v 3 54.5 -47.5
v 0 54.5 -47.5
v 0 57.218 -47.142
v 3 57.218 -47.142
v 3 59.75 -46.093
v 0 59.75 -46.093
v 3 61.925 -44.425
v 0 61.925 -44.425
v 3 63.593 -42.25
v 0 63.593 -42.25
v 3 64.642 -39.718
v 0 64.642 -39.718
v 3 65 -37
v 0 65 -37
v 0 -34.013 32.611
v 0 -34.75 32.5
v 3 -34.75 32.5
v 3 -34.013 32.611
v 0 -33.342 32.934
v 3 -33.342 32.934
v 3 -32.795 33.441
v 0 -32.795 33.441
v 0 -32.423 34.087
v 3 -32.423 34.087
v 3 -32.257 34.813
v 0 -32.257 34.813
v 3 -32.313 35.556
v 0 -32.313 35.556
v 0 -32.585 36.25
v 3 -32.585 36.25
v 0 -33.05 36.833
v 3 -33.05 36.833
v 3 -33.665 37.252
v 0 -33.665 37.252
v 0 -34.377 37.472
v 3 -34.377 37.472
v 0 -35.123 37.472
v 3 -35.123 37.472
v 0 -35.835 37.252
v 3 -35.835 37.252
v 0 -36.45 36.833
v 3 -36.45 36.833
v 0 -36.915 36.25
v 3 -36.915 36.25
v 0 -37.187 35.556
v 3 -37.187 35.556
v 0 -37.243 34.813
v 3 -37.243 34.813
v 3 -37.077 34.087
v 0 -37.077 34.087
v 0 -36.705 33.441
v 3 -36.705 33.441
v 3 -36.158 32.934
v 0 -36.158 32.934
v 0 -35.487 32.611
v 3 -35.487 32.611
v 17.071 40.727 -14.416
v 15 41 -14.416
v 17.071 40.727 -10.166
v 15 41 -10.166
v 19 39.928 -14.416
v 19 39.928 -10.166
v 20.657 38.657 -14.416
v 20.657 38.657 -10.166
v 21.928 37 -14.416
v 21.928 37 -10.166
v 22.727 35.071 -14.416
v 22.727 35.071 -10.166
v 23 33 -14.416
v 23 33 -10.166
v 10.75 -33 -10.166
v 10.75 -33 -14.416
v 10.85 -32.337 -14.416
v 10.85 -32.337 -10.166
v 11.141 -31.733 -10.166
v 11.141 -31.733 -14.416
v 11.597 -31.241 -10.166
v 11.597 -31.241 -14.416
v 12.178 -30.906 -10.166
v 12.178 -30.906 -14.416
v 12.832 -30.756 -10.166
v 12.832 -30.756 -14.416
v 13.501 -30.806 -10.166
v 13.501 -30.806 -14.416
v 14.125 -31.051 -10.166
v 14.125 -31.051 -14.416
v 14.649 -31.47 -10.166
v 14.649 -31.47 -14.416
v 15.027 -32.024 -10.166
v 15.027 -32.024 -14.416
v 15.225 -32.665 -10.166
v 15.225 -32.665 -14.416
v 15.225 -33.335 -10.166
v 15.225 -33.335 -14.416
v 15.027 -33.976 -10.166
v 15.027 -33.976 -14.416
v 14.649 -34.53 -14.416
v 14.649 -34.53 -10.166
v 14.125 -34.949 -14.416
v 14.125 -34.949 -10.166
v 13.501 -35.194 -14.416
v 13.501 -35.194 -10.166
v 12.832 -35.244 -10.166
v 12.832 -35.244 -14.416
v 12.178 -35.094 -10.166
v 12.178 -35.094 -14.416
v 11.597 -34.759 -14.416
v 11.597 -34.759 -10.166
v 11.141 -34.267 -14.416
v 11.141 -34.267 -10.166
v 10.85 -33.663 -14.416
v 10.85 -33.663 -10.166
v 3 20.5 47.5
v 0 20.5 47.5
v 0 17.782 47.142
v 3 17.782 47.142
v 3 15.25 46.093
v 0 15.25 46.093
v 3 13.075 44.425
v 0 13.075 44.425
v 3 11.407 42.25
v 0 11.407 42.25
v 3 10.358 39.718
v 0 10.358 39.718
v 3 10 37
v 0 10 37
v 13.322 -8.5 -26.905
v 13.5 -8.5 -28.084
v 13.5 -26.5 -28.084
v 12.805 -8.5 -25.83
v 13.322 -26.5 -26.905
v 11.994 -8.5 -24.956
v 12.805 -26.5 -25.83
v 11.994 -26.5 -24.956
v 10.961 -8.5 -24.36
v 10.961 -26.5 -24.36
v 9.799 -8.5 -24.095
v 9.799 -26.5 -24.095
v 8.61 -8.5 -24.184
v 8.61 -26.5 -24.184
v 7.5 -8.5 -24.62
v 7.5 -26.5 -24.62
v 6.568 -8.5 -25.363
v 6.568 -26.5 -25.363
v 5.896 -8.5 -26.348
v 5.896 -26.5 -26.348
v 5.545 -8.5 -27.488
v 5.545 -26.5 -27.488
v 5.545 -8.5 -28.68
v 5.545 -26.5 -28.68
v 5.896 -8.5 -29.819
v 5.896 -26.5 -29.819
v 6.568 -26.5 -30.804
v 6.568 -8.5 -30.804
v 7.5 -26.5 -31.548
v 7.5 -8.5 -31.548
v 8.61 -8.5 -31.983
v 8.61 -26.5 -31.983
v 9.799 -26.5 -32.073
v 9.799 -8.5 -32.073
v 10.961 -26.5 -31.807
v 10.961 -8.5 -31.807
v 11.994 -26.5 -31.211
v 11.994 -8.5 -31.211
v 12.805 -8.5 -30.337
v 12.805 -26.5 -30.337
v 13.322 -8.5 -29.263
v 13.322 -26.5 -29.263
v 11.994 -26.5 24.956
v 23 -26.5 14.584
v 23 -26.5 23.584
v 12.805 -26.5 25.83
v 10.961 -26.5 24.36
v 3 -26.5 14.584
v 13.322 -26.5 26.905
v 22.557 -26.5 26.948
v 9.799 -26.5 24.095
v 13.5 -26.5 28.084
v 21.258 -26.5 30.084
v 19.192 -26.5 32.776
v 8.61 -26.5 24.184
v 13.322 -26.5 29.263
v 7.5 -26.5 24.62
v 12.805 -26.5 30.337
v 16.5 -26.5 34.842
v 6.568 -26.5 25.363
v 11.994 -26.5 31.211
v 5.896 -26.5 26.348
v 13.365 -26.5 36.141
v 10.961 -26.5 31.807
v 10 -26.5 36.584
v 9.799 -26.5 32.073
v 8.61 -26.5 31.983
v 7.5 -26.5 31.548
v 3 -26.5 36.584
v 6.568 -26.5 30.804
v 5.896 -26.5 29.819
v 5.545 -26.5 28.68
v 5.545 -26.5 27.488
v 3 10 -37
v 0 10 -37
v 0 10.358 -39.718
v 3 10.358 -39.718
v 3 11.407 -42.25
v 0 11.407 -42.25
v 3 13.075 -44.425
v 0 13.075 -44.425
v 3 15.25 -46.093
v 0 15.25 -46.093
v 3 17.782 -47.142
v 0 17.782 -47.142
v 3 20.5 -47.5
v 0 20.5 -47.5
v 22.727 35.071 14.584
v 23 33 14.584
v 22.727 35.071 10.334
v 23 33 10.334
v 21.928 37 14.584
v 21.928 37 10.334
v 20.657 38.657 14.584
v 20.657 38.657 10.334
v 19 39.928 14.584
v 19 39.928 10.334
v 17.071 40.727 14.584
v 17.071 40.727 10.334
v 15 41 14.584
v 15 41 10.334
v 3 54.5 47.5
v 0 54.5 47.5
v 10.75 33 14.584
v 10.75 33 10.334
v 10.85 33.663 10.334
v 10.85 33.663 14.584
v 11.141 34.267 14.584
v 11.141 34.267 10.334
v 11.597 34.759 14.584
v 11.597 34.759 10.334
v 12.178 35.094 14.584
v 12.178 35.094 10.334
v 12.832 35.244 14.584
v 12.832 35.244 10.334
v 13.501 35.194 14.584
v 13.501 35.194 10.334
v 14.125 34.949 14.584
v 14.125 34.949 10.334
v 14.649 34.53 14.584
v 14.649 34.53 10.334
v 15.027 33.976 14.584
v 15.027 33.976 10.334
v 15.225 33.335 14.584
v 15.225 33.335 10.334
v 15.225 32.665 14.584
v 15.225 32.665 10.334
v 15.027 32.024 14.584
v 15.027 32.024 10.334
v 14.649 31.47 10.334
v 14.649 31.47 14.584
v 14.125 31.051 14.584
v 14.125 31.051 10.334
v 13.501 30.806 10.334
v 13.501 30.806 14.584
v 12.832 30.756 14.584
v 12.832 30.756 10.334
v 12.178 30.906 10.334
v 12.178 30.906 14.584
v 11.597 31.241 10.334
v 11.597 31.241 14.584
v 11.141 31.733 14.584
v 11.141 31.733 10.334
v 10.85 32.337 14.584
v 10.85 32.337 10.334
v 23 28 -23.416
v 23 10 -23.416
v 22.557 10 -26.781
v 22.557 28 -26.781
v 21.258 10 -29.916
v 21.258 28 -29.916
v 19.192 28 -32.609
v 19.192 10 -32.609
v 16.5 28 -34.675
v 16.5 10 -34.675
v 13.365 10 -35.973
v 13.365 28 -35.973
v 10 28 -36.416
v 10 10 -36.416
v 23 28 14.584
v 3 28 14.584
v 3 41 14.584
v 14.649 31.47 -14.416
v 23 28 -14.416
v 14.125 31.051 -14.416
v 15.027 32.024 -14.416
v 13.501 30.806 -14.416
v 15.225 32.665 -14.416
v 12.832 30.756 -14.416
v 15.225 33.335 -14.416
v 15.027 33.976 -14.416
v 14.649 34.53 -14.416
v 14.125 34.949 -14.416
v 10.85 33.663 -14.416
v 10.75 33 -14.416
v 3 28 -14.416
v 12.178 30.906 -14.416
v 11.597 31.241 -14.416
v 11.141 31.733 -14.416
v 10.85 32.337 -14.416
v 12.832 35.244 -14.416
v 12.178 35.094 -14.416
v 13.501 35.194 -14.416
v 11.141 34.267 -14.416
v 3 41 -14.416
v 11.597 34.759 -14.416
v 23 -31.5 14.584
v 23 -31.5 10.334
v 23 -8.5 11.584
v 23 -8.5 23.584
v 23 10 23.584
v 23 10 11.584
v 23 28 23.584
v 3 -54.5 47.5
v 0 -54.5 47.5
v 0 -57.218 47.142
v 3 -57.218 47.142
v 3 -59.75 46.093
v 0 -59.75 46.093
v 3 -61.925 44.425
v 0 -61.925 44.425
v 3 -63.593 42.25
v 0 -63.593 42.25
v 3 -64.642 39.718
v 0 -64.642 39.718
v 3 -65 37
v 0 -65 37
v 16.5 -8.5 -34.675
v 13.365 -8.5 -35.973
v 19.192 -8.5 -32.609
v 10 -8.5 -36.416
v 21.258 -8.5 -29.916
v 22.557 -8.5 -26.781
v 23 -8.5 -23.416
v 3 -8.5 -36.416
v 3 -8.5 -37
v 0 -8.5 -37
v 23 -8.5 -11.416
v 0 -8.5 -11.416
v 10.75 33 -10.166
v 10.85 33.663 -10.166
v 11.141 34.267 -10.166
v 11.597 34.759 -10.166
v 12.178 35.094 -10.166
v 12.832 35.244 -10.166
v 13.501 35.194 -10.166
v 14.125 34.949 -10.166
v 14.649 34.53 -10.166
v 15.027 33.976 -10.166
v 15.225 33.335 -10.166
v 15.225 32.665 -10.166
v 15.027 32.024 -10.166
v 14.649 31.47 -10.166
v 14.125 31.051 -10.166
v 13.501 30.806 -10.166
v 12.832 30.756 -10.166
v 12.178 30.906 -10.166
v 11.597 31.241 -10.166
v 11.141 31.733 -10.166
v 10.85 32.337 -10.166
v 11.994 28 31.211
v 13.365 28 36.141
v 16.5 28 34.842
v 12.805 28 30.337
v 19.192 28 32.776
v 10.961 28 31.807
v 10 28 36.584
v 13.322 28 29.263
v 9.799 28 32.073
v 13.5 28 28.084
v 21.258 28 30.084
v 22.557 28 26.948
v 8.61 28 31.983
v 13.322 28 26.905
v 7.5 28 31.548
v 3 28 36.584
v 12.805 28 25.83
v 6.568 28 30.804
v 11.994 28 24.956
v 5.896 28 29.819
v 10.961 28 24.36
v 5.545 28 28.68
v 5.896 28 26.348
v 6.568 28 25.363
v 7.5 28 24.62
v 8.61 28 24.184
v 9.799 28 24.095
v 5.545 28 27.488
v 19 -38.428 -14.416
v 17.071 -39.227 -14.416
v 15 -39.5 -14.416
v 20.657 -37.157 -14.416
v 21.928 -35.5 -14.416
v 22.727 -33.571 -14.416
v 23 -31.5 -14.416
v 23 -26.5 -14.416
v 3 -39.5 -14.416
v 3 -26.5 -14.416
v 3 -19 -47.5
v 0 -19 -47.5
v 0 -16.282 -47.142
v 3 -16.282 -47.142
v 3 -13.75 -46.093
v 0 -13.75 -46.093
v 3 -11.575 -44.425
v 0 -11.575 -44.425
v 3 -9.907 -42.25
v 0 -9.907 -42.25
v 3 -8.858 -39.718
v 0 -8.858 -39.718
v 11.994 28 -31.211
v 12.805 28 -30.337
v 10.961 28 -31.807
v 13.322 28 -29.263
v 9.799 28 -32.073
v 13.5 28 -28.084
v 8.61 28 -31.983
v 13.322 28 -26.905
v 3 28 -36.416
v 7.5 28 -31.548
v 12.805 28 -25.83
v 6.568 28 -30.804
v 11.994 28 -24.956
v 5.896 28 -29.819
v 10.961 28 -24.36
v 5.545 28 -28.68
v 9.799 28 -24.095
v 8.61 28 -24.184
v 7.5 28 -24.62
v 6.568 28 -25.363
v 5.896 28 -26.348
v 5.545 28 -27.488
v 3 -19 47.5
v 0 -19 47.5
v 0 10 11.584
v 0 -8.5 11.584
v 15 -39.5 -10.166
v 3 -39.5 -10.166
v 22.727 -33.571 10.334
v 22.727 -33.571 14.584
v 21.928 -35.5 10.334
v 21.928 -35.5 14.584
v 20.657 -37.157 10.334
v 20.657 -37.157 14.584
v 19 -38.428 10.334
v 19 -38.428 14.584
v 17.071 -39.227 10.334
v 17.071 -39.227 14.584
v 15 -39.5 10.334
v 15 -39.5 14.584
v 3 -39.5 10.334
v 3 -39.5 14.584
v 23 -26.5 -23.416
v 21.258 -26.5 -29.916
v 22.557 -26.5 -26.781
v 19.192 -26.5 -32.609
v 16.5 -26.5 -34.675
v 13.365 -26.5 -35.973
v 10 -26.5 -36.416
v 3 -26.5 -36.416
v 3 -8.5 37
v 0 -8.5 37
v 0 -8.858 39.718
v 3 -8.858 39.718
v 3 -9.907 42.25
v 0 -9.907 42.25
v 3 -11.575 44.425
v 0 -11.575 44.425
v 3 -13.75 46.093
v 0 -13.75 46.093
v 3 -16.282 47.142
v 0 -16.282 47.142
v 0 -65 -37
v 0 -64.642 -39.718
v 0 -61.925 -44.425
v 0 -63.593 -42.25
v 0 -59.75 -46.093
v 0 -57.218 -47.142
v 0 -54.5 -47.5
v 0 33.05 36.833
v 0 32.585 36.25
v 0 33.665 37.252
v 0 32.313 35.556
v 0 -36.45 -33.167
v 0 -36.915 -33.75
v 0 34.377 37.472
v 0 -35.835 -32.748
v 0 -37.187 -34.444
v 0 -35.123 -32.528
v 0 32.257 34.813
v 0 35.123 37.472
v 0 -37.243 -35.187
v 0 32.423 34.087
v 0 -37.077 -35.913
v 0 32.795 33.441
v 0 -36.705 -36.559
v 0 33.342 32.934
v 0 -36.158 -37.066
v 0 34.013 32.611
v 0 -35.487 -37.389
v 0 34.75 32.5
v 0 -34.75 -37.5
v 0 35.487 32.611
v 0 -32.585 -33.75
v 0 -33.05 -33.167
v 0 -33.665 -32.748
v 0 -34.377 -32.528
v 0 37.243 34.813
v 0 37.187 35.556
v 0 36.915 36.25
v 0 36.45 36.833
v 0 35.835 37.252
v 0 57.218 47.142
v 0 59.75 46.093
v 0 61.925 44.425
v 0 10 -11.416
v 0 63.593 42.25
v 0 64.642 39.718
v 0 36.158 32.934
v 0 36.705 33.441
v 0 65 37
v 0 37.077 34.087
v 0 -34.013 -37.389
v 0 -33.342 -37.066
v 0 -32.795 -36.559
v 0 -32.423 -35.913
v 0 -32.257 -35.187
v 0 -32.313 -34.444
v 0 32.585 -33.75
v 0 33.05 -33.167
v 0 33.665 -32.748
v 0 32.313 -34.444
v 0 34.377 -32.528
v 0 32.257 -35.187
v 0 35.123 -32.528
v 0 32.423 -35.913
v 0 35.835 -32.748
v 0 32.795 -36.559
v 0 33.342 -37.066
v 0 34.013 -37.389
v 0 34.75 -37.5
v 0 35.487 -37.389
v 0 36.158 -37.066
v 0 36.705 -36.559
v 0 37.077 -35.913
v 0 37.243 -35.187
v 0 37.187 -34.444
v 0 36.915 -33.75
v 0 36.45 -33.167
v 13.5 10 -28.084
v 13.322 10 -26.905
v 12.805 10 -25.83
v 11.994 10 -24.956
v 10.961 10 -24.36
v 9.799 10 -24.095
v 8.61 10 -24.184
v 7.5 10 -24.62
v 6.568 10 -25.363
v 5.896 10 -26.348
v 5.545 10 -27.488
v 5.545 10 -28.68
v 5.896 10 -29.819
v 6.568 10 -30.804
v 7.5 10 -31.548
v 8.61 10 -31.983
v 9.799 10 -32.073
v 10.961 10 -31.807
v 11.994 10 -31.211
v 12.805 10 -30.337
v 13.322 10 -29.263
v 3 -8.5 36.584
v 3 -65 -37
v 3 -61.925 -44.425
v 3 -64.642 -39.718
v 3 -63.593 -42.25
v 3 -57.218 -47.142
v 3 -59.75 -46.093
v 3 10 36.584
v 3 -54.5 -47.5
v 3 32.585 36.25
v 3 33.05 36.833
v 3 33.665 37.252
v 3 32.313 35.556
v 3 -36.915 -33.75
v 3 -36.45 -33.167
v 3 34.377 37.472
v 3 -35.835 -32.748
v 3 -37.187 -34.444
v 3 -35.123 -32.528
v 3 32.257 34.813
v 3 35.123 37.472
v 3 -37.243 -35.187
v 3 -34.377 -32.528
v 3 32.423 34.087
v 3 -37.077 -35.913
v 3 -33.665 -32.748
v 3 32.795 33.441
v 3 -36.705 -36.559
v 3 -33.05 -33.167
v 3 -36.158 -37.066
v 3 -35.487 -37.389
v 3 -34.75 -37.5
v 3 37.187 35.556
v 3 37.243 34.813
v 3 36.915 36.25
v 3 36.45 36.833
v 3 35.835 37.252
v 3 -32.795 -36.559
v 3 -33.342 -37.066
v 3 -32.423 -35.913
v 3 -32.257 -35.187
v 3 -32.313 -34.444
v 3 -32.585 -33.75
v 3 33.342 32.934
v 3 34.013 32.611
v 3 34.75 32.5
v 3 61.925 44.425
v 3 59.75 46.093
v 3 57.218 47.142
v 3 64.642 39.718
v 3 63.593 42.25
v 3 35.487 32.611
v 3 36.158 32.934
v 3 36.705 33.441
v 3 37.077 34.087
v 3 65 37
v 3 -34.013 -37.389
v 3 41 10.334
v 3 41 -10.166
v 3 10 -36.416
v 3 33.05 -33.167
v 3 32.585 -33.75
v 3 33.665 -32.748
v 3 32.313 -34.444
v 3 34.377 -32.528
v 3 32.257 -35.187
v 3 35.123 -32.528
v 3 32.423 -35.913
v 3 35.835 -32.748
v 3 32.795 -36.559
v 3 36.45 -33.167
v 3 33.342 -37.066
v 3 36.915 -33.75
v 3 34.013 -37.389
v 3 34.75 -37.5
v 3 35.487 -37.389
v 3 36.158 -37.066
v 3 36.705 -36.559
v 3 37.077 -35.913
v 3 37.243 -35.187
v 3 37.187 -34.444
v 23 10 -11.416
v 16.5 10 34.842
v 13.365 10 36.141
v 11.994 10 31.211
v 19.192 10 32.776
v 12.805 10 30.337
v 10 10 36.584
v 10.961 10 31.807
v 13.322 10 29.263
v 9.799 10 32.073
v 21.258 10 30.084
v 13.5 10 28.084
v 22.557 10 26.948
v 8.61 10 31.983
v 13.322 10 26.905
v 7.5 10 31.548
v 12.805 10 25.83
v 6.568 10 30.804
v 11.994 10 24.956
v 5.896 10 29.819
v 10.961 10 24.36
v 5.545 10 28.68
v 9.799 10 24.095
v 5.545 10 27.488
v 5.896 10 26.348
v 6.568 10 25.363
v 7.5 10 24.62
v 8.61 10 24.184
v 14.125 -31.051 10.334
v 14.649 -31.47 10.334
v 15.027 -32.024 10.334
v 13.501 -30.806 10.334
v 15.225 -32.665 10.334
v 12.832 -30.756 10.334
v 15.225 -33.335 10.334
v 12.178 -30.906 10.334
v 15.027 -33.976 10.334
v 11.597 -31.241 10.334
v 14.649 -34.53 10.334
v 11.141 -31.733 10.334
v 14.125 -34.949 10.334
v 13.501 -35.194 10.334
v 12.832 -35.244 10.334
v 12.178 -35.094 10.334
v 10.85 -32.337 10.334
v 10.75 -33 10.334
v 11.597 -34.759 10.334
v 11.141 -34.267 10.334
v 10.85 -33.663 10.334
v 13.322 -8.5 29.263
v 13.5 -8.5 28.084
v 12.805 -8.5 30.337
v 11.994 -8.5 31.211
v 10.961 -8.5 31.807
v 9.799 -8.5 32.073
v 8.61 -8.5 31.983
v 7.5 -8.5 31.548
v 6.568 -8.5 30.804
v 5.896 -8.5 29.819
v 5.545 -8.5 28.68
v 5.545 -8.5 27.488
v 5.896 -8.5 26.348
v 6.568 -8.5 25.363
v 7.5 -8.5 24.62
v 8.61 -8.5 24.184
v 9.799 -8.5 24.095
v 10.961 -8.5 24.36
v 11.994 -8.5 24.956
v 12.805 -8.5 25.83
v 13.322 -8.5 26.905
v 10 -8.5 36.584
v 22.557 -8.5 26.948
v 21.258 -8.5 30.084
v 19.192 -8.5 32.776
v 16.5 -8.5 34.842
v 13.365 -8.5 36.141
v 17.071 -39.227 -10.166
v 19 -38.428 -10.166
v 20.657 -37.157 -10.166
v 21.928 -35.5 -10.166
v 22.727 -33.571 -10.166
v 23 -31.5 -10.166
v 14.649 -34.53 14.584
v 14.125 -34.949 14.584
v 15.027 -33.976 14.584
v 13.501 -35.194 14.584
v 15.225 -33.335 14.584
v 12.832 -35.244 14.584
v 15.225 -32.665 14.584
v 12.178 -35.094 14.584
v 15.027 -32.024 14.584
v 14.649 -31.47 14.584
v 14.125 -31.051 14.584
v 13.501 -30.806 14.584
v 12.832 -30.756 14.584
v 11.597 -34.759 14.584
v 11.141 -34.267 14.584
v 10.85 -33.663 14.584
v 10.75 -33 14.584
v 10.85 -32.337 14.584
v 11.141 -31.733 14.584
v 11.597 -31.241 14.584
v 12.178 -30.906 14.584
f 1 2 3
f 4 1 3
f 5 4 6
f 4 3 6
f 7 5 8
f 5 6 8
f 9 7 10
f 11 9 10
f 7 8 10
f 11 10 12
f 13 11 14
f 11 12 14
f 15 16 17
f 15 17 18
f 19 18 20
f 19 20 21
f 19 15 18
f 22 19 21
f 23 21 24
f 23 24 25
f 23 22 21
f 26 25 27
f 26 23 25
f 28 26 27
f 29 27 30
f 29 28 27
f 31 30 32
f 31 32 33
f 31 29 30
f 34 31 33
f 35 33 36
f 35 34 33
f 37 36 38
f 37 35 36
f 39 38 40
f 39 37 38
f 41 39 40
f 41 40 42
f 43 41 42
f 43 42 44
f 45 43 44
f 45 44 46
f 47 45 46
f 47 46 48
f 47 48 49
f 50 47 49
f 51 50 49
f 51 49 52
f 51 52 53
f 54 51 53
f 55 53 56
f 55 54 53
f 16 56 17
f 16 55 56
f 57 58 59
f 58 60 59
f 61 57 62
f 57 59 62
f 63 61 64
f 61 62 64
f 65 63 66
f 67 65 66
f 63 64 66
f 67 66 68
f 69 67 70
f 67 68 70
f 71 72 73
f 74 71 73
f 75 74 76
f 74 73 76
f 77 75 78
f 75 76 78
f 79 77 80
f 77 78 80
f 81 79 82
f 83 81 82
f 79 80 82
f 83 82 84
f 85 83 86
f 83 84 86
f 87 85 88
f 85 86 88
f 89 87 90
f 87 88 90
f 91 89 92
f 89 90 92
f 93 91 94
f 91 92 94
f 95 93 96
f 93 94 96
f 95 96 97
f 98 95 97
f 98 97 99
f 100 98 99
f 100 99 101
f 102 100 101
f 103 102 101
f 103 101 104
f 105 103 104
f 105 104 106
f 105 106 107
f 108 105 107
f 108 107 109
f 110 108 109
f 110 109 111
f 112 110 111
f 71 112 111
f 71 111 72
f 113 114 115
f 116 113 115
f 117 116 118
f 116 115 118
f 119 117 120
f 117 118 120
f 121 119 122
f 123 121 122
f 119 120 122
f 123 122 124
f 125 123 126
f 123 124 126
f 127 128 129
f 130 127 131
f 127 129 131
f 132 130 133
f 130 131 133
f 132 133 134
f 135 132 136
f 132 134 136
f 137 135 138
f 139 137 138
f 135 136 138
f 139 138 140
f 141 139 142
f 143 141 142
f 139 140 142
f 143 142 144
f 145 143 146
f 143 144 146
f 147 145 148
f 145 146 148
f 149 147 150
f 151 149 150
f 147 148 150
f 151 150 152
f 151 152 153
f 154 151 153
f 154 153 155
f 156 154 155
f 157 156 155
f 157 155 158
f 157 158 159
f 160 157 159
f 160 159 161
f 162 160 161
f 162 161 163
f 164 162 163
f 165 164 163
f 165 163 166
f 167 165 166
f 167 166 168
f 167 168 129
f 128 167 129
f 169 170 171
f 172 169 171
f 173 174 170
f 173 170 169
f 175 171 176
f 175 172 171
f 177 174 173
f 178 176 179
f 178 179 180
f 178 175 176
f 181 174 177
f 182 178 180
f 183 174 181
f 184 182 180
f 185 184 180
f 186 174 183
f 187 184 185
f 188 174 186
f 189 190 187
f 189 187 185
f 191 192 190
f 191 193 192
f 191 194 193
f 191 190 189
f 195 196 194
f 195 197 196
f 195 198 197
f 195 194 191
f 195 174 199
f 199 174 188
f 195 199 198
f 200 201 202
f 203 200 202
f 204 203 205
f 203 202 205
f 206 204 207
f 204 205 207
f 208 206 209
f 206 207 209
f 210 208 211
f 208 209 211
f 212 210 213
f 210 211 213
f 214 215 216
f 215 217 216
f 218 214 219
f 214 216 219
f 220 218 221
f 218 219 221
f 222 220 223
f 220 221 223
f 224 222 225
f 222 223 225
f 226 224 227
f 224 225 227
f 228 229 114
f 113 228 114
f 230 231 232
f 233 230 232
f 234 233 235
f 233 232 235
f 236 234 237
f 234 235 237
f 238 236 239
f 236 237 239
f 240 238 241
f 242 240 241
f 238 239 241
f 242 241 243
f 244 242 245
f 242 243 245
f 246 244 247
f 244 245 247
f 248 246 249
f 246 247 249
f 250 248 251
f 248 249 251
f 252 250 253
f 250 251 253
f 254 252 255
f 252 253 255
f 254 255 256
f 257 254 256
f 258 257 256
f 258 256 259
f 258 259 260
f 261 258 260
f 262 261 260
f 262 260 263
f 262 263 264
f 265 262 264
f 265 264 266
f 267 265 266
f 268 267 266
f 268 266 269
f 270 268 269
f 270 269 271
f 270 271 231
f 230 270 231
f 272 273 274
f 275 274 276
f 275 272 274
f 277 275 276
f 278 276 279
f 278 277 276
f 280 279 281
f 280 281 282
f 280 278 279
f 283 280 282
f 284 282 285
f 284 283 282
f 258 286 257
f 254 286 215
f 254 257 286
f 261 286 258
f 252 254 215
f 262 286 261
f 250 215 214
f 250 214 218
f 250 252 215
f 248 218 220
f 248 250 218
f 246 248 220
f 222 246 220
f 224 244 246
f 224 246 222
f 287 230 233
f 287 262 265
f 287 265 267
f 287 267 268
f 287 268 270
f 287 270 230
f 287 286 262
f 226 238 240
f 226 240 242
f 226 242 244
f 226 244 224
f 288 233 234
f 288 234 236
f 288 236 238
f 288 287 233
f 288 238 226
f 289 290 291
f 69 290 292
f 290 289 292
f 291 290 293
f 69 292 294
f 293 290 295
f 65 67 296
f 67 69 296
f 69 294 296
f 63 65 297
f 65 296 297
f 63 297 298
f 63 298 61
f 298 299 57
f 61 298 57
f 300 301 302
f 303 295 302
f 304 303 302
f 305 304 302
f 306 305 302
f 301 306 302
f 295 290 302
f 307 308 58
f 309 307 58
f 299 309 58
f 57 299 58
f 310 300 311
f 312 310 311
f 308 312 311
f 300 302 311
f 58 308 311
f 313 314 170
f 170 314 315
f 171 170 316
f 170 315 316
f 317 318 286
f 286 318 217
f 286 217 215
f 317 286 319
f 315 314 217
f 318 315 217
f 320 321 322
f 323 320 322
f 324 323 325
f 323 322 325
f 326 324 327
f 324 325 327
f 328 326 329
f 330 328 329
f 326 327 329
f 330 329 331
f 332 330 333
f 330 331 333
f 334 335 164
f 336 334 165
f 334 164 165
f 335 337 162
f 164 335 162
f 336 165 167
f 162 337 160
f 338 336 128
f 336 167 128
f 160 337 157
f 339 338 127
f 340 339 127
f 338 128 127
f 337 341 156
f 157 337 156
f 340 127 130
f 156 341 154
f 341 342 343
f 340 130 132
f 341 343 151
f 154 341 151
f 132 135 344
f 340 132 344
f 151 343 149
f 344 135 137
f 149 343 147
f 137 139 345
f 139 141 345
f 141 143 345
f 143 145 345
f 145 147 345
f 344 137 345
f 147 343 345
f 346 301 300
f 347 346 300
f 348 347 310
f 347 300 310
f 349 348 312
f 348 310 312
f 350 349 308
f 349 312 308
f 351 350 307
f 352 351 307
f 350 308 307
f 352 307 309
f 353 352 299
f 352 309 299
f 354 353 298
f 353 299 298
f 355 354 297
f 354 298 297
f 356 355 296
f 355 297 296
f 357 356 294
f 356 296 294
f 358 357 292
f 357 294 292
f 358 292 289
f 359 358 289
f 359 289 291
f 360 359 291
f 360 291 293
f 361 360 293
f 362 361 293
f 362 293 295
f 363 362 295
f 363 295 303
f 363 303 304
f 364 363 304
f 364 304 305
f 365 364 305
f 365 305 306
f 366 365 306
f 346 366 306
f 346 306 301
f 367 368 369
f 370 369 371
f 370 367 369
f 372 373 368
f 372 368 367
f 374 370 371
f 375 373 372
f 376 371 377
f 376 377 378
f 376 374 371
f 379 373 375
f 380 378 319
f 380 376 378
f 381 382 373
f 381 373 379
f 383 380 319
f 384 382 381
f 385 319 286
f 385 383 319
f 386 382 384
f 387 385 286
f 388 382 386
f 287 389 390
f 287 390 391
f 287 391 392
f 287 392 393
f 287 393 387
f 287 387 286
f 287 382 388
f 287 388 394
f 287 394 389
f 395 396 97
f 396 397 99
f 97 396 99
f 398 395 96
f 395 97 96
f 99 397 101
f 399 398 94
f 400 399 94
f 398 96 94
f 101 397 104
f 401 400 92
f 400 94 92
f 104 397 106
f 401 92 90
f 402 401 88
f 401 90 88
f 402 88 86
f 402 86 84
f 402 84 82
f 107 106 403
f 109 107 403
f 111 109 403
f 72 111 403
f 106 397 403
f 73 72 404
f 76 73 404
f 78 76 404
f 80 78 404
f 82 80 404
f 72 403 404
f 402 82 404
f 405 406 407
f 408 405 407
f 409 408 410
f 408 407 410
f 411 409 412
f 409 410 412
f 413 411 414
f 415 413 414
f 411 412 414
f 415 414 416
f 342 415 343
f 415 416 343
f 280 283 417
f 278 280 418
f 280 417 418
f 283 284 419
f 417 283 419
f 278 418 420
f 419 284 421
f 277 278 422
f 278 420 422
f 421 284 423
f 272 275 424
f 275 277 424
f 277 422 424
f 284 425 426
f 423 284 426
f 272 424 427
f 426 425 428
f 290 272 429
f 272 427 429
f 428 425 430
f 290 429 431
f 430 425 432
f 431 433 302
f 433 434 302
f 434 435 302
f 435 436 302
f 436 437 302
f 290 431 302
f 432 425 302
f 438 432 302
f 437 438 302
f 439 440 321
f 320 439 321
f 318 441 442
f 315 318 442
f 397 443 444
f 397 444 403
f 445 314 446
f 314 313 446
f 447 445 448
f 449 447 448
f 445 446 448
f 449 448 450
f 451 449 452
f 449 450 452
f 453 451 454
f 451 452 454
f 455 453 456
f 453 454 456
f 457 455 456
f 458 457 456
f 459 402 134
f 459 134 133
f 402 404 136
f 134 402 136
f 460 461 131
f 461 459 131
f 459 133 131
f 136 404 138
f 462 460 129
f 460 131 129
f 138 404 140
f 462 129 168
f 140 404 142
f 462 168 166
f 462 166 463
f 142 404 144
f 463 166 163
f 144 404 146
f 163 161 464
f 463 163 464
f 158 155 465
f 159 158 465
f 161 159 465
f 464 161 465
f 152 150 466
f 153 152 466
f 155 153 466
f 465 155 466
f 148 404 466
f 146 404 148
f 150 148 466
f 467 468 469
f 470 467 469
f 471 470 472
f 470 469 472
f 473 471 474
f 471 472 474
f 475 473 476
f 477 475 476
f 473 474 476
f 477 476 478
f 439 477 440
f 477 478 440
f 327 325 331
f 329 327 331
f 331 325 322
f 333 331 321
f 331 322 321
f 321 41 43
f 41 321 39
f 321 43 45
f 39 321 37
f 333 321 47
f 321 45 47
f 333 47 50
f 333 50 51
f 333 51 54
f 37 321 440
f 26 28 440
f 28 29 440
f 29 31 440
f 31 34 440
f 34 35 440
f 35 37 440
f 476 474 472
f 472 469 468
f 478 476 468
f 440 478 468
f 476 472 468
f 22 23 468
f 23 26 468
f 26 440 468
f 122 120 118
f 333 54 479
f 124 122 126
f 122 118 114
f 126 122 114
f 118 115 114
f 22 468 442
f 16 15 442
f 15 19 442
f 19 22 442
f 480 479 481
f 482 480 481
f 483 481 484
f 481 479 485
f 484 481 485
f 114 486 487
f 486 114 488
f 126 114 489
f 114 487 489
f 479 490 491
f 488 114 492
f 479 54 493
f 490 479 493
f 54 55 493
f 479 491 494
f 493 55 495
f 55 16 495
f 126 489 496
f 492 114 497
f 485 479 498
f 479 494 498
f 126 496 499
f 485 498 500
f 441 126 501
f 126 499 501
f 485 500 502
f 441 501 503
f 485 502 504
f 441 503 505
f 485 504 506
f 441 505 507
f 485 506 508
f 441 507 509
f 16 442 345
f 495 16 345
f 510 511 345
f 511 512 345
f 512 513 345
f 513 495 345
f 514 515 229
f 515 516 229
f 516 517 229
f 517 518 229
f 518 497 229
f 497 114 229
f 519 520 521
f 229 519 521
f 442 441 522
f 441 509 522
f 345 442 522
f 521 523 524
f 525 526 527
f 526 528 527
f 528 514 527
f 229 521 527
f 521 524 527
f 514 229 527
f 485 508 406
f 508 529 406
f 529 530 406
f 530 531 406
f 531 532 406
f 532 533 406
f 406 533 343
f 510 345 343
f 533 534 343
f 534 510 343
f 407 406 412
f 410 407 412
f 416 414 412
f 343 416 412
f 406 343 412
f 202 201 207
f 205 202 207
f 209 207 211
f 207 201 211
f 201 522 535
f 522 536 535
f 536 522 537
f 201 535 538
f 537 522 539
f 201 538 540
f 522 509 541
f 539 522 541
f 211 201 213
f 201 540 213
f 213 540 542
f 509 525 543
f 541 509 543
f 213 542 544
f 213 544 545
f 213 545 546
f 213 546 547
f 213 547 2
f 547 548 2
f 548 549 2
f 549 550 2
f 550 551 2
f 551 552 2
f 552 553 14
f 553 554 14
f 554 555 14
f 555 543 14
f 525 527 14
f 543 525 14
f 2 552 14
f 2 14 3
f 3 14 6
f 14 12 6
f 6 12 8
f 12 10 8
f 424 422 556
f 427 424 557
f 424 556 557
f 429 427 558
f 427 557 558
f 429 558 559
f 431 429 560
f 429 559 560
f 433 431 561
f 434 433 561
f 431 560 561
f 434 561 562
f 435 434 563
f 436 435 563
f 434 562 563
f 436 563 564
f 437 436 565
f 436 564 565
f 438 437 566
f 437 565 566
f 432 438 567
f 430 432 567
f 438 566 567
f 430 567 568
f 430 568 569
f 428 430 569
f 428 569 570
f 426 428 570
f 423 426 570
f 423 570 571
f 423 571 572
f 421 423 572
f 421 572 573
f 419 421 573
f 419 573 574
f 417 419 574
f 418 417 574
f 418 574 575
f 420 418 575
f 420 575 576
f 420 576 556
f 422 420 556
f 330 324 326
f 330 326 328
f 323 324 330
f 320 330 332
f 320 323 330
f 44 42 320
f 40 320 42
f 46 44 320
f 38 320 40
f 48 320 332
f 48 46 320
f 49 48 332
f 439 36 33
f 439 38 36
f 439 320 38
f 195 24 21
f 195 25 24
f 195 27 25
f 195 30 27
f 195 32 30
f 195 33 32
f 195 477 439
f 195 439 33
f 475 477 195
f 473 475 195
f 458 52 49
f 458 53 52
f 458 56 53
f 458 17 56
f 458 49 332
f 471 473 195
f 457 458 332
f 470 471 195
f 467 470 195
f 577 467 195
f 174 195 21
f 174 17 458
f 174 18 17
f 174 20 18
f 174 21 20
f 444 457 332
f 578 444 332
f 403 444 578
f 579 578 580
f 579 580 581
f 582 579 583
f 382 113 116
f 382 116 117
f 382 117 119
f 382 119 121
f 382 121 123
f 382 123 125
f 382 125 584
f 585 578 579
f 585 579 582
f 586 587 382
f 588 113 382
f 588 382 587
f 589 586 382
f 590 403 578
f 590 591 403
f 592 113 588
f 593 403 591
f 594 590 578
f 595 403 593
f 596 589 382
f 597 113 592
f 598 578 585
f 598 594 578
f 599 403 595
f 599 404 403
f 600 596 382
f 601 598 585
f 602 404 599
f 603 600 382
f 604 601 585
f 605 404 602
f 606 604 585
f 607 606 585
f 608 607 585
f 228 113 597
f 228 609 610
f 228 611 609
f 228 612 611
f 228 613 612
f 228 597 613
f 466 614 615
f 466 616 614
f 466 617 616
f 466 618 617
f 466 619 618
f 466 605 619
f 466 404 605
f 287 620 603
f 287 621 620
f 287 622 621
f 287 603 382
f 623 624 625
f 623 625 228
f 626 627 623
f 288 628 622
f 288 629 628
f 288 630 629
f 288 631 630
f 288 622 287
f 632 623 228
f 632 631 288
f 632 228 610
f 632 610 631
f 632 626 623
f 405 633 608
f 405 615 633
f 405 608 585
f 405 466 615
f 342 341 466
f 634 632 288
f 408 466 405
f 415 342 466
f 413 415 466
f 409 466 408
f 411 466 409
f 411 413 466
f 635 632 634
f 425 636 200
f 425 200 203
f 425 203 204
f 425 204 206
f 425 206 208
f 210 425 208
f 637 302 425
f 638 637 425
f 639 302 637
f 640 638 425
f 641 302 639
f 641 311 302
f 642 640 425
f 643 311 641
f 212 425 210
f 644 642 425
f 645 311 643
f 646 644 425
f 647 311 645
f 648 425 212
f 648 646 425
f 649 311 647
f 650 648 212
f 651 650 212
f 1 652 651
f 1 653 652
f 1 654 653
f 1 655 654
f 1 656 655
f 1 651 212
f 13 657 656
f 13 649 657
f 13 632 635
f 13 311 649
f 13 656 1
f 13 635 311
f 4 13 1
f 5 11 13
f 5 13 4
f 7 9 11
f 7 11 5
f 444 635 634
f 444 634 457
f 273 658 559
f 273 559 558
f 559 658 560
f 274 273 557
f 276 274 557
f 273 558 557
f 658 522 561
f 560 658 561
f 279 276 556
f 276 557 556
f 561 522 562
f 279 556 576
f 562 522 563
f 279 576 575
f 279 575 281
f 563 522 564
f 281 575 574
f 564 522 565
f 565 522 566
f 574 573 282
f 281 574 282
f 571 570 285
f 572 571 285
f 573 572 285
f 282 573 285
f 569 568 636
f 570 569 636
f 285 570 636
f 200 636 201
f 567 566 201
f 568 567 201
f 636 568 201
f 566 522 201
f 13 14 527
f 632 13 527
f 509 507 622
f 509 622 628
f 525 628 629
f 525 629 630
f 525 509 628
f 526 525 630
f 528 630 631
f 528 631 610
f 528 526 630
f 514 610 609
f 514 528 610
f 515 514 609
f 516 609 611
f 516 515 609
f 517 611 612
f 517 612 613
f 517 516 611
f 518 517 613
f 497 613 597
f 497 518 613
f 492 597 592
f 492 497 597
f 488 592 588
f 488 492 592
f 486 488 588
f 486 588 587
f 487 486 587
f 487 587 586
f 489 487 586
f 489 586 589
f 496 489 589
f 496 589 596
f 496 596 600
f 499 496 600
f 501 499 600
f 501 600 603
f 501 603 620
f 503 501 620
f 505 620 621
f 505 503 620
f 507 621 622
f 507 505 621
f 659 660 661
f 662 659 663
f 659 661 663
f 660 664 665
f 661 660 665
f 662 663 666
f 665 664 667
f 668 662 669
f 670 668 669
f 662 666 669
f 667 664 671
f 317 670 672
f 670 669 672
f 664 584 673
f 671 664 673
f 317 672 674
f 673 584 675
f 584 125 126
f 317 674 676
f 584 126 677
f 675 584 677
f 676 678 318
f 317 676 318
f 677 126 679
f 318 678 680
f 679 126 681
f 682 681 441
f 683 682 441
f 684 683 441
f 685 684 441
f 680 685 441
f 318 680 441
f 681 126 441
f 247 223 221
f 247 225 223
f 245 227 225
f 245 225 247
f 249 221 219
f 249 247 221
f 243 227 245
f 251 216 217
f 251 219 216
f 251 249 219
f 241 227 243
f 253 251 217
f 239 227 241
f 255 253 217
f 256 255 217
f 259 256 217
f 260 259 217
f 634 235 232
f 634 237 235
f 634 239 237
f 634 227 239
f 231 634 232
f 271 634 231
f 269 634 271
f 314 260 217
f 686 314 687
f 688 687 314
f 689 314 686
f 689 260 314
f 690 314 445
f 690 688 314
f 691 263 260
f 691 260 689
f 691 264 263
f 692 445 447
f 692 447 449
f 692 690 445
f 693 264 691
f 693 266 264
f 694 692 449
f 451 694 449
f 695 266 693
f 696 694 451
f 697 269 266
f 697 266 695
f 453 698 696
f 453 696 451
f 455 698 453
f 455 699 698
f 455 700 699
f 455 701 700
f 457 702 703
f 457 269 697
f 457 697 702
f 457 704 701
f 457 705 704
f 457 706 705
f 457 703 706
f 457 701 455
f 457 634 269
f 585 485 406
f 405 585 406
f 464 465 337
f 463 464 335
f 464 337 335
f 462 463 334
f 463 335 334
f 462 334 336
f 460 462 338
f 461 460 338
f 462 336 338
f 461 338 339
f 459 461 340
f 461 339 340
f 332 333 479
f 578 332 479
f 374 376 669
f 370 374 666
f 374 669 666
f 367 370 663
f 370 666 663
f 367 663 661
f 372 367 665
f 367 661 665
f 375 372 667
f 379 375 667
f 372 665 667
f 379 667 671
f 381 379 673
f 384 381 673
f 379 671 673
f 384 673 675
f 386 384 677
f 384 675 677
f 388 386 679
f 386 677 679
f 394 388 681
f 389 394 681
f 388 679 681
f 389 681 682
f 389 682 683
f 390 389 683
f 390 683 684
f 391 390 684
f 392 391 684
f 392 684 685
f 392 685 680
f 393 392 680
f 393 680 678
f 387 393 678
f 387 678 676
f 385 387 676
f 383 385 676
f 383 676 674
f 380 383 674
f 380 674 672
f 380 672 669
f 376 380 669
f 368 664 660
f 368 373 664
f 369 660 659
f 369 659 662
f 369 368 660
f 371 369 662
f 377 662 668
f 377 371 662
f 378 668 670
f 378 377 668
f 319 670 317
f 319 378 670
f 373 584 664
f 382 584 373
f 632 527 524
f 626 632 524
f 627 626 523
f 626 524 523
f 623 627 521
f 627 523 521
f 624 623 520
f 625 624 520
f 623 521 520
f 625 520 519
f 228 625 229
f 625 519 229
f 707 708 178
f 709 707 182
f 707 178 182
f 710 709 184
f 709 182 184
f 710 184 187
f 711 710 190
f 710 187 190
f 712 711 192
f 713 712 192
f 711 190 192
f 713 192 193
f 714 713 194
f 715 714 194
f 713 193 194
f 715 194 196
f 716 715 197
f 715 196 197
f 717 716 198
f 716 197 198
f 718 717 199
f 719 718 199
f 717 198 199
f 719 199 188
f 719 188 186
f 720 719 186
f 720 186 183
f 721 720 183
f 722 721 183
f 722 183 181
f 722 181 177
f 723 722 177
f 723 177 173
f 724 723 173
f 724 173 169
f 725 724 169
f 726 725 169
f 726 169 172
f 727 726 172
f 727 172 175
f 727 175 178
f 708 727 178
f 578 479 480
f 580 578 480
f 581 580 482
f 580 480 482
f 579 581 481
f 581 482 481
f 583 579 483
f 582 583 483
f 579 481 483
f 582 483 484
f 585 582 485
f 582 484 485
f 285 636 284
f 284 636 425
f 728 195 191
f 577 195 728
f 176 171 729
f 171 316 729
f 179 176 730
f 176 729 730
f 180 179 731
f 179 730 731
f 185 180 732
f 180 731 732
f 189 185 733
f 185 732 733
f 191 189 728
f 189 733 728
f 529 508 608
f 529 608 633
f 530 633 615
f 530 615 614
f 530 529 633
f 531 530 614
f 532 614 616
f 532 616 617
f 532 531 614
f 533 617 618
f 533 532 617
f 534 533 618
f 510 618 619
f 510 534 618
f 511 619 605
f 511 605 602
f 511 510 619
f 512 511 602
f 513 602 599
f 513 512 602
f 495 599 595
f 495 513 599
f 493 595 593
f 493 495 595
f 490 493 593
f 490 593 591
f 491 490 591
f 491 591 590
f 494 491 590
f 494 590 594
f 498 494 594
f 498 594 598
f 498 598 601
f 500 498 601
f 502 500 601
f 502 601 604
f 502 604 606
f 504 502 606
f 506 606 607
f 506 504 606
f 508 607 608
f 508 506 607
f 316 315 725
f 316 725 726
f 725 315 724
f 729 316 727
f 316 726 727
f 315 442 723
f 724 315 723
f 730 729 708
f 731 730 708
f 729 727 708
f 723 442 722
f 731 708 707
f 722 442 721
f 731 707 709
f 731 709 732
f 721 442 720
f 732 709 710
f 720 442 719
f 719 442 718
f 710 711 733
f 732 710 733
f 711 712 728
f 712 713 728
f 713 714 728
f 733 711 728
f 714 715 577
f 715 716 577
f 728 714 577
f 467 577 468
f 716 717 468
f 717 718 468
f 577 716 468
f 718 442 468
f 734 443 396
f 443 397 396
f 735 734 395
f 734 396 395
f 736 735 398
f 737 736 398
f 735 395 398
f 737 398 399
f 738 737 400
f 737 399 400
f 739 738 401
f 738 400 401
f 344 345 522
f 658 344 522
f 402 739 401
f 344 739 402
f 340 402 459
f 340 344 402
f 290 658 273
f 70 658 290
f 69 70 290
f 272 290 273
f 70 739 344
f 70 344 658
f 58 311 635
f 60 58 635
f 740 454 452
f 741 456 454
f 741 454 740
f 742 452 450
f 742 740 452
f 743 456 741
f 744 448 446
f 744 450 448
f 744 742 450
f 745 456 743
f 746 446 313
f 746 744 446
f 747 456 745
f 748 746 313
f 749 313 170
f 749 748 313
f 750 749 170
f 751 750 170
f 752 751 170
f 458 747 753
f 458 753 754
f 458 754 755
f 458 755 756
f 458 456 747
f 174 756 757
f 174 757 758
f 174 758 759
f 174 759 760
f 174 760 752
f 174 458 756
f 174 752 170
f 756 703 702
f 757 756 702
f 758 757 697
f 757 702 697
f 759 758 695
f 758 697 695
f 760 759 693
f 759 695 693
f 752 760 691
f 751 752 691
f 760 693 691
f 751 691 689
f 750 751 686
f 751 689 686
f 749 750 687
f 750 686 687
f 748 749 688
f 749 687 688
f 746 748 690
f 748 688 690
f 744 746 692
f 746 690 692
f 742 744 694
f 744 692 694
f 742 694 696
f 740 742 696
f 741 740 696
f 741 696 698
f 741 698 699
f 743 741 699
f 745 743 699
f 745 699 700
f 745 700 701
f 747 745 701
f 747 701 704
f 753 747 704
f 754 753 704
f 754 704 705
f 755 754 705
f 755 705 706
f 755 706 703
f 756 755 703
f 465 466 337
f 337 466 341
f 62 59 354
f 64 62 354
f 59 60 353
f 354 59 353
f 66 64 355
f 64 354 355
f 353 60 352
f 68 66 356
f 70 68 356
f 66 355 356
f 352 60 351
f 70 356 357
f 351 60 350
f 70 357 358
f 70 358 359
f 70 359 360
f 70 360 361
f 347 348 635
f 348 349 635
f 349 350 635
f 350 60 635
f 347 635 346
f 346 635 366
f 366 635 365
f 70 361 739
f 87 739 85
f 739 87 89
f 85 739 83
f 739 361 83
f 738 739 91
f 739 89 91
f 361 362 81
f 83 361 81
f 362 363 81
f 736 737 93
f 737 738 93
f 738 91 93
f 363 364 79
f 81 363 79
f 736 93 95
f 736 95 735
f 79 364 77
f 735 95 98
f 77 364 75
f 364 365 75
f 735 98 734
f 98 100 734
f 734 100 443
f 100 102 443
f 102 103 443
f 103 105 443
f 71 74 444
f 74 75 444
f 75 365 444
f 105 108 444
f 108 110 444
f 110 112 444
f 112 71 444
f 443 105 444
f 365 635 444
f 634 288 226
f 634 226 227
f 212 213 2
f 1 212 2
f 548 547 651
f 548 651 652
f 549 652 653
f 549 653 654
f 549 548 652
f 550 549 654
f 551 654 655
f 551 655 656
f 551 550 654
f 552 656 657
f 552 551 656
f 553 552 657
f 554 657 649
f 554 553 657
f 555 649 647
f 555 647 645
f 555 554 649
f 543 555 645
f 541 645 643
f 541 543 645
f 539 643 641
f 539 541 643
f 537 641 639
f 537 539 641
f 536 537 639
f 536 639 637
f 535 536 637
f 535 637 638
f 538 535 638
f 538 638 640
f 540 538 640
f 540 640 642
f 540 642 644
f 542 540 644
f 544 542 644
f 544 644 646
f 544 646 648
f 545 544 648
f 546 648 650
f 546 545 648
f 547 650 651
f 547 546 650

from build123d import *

# Parameters (mm, degrees)
SKETCH1_R               = 2.5
BOSS_EXTRUDE1_DEPTH     = 3
BOSS_EXTRUDE2_DEPTH     = 23
FILLET1_R               = 13
FILLET2_R               = 8
CUT_EXTRUDE1_DEPTH      = 106.629068292
CUT_EXTRUDE1_DEPTH_BACK = 106.629068292
SKETCH2_R               = 4
CUT_EXTRUDE2_DEPTH      = 93.669410672
CUT_EXTRUDE2_DEPTH_BACK = 93.669410672
SKETCH3_R               = 2.25


with BuildPart() as part:
    # Sketch1 → Boss-Extrude1 (new body)
    with BuildSketch(Plane(origin=(0, 0, 0), x_dir=(0, 0, -1), z_dir=(1, 0, 0))):
        with BuildLine():
            ThreePointArc((47.5, 54.5), (44.424621202, 61.924621202), (37, 65))
            Line((37, 65), (-37, 65))
            ThreePointArc((-37, 65), (-44.424621202, 61.924621202), (-47.5, 54.5))
            Line((-47.5, 54.5), (-47.5, 20.500000268))
            ThreePointArc((-47.5, 20.500000268), (-44.424621202, 13.075379066), (-37, 10.000000268))
            Line((-37, 10.000000268), (-11.583769402, 10.000000268))
            Line((-11.583769402, 10.000000268), (-11.583769402, -8.500000373))
            Line((-11.583769402, -8.500000373), (-37, -8.500000373))
            ThreePointArc((-37, -8.500000373), (-44.424621202, -11.57537917), (-47.5, -19.000000373))
            Line((-47.5, -19.000000373), (-47.5, -54.5))
            ThreePointArc((-47.5, -54.5), (-44.424621202, -61.924621202), (-37, -65))
            Line((-37, -65), (37, -65))
            ThreePointArc((37, -65), (44.424621202, -61.924621202), (47.5, -54.5))
            Line((47.5, -54.5), (47.5, -19.000000373))
            ThreePointArc((47.5, -19.000000373), (44.424621202, -11.57537917), (37, -8.500000373))
            Line((37, -8.500000373), (11.416231668, -8.500000373))
            Line((11.416231668, -8.500000373), (11.416231668, 10.000000268))
            Line((11.416231668, 10.000000268), (37, 10.000000268))
            ThreePointArc((37, 10.000000268), (44.424621202, 13.075379066), (47.5, 20.500000268))
            Line((47.5, 20.500000268), (47.5, 54.5))
        make_face()
        with Locations((-35, -34.75)):
            Circle(SKETCH1_R, mode=Mode.SUBTRACT)
        with Locations((35, -34.75)):
            Circle(SKETCH1_R, mode=Mode.SUBTRACT)
        with Locations((-35, 34.75)):
            Circle(SKETCH1_R, mode=Mode.SUBTRACT)
        with Locations((35, 34.75)):
            Circle(SKETCH1_R, mode=Mode.SUBTRACT)
    extrude(amount=BOSS_EXTRUDE1_DEPTH)

    # Sketch1<3> → Boss-Extrude2 (add)
    with BuildSketch(Plane(origin=(0, 0, 0), x_dir=(0, 0, -1), z_dir=(1, 0, 0))):
        Polygon((11.416231668, 10.000000268), (36.416231105, 10.000000268), (36.416231105, 28.000000268), (14.416231105, 28.000000268), (14.416231105, 41.000000268), (10.166231386, 41.000000268), (10.166231386, -39.500000373), (14.416231105, -39.500000373), (14.416231105, -26.500000373), (36.416231105, -26.500000373), (36.416231105, -8.500000373), (11.416231668, -8.500000373), align=None)
        Polygon((-36.583768839, 28.000000268), (-36.583768839, 10.000000268), (-11.583769402, 10.000000268), (-11.583769402, -8.500000373), (-36.583768839, -8.500000373), (-36.583768839, -26.500000373), (-14.583768839, -26.500000373), (-14.583768839, -39.500000373), (-10.33376912, -39.500000373), (-10.33376912, 41.000000268), (-14.583768839, 41.000000268), (-14.583768839, 28.000000268), align=None)
    extrude(amount=BOSS_EXTRUDE2_DEPTH)

    # Fillet1
    fillet1_edges = [part.edges().sort_by_distance(p)[0] for p in [
        (23, 19.000000268, -36.416231105),
        (23, -17.500000373, -36.416231105),
        (23, -17.500000373, 36.583768839),
        (23, 19.000000268, 36.583768839),
    ]]
    fillet(fillet1_edges, radius=FILLET1_R)

    # Fillet2
    fillet2_edges = [part.edges().sort_by_distance(p)[0] for p in [
        (23, 41.000000268, 12.45876898),
        (23, 41.000000268, -12.291231246),
        (23, -39.500000373, -12.291231246),
        (23, -39.500000373, 12.45876898),
    ]]
    fillet(fillet2_edges, radius=FILLET2_R)

    # Sketch2 → Cut-Extrude1 (cut, two sides: drawn at the far end of the back side and taken through both)
    with BuildSketch(Plane.XZ.offset(26.500000373).offset(-CUT_EXTRUDE1_DEPTH_BACK)):
        with Locations((9.5, 28.083768839)):
            Circle(SKETCH2_R)
        with Locations((9.5, -28.083768839)):
            Circle(SKETCH2_R)
    extrude(amount=CUT_EXTRUDE1_DEPTH + CUT_EXTRUDE1_DEPTH_BACK, mode=Mode.SUBTRACT)

    # Sketch3 → Cut-Extrude2 (cut, two sides: drawn at the far end of the back side and taken through both)
    with BuildSketch(Plane(origin=(0, 0, -14.416231105), x_dir=(-1, 0, 0), z_dir=(0, 0, -1)).offset(-CUT_EXTRUDE2_DEPTH_BACK)):
        with Locations((-13, -33.000000373)):
            Circle(SKETCH3_R)
        with Locations((-13, 33.000000373)):
            Circle(SKETCH3_R)
    extrude(amount=CUT_EXTRUDE2_DEPTH + CUT_EXTRUDE2_DEPTH_BACK, mode=Mode.SUBTRACT)


solid = part.part
